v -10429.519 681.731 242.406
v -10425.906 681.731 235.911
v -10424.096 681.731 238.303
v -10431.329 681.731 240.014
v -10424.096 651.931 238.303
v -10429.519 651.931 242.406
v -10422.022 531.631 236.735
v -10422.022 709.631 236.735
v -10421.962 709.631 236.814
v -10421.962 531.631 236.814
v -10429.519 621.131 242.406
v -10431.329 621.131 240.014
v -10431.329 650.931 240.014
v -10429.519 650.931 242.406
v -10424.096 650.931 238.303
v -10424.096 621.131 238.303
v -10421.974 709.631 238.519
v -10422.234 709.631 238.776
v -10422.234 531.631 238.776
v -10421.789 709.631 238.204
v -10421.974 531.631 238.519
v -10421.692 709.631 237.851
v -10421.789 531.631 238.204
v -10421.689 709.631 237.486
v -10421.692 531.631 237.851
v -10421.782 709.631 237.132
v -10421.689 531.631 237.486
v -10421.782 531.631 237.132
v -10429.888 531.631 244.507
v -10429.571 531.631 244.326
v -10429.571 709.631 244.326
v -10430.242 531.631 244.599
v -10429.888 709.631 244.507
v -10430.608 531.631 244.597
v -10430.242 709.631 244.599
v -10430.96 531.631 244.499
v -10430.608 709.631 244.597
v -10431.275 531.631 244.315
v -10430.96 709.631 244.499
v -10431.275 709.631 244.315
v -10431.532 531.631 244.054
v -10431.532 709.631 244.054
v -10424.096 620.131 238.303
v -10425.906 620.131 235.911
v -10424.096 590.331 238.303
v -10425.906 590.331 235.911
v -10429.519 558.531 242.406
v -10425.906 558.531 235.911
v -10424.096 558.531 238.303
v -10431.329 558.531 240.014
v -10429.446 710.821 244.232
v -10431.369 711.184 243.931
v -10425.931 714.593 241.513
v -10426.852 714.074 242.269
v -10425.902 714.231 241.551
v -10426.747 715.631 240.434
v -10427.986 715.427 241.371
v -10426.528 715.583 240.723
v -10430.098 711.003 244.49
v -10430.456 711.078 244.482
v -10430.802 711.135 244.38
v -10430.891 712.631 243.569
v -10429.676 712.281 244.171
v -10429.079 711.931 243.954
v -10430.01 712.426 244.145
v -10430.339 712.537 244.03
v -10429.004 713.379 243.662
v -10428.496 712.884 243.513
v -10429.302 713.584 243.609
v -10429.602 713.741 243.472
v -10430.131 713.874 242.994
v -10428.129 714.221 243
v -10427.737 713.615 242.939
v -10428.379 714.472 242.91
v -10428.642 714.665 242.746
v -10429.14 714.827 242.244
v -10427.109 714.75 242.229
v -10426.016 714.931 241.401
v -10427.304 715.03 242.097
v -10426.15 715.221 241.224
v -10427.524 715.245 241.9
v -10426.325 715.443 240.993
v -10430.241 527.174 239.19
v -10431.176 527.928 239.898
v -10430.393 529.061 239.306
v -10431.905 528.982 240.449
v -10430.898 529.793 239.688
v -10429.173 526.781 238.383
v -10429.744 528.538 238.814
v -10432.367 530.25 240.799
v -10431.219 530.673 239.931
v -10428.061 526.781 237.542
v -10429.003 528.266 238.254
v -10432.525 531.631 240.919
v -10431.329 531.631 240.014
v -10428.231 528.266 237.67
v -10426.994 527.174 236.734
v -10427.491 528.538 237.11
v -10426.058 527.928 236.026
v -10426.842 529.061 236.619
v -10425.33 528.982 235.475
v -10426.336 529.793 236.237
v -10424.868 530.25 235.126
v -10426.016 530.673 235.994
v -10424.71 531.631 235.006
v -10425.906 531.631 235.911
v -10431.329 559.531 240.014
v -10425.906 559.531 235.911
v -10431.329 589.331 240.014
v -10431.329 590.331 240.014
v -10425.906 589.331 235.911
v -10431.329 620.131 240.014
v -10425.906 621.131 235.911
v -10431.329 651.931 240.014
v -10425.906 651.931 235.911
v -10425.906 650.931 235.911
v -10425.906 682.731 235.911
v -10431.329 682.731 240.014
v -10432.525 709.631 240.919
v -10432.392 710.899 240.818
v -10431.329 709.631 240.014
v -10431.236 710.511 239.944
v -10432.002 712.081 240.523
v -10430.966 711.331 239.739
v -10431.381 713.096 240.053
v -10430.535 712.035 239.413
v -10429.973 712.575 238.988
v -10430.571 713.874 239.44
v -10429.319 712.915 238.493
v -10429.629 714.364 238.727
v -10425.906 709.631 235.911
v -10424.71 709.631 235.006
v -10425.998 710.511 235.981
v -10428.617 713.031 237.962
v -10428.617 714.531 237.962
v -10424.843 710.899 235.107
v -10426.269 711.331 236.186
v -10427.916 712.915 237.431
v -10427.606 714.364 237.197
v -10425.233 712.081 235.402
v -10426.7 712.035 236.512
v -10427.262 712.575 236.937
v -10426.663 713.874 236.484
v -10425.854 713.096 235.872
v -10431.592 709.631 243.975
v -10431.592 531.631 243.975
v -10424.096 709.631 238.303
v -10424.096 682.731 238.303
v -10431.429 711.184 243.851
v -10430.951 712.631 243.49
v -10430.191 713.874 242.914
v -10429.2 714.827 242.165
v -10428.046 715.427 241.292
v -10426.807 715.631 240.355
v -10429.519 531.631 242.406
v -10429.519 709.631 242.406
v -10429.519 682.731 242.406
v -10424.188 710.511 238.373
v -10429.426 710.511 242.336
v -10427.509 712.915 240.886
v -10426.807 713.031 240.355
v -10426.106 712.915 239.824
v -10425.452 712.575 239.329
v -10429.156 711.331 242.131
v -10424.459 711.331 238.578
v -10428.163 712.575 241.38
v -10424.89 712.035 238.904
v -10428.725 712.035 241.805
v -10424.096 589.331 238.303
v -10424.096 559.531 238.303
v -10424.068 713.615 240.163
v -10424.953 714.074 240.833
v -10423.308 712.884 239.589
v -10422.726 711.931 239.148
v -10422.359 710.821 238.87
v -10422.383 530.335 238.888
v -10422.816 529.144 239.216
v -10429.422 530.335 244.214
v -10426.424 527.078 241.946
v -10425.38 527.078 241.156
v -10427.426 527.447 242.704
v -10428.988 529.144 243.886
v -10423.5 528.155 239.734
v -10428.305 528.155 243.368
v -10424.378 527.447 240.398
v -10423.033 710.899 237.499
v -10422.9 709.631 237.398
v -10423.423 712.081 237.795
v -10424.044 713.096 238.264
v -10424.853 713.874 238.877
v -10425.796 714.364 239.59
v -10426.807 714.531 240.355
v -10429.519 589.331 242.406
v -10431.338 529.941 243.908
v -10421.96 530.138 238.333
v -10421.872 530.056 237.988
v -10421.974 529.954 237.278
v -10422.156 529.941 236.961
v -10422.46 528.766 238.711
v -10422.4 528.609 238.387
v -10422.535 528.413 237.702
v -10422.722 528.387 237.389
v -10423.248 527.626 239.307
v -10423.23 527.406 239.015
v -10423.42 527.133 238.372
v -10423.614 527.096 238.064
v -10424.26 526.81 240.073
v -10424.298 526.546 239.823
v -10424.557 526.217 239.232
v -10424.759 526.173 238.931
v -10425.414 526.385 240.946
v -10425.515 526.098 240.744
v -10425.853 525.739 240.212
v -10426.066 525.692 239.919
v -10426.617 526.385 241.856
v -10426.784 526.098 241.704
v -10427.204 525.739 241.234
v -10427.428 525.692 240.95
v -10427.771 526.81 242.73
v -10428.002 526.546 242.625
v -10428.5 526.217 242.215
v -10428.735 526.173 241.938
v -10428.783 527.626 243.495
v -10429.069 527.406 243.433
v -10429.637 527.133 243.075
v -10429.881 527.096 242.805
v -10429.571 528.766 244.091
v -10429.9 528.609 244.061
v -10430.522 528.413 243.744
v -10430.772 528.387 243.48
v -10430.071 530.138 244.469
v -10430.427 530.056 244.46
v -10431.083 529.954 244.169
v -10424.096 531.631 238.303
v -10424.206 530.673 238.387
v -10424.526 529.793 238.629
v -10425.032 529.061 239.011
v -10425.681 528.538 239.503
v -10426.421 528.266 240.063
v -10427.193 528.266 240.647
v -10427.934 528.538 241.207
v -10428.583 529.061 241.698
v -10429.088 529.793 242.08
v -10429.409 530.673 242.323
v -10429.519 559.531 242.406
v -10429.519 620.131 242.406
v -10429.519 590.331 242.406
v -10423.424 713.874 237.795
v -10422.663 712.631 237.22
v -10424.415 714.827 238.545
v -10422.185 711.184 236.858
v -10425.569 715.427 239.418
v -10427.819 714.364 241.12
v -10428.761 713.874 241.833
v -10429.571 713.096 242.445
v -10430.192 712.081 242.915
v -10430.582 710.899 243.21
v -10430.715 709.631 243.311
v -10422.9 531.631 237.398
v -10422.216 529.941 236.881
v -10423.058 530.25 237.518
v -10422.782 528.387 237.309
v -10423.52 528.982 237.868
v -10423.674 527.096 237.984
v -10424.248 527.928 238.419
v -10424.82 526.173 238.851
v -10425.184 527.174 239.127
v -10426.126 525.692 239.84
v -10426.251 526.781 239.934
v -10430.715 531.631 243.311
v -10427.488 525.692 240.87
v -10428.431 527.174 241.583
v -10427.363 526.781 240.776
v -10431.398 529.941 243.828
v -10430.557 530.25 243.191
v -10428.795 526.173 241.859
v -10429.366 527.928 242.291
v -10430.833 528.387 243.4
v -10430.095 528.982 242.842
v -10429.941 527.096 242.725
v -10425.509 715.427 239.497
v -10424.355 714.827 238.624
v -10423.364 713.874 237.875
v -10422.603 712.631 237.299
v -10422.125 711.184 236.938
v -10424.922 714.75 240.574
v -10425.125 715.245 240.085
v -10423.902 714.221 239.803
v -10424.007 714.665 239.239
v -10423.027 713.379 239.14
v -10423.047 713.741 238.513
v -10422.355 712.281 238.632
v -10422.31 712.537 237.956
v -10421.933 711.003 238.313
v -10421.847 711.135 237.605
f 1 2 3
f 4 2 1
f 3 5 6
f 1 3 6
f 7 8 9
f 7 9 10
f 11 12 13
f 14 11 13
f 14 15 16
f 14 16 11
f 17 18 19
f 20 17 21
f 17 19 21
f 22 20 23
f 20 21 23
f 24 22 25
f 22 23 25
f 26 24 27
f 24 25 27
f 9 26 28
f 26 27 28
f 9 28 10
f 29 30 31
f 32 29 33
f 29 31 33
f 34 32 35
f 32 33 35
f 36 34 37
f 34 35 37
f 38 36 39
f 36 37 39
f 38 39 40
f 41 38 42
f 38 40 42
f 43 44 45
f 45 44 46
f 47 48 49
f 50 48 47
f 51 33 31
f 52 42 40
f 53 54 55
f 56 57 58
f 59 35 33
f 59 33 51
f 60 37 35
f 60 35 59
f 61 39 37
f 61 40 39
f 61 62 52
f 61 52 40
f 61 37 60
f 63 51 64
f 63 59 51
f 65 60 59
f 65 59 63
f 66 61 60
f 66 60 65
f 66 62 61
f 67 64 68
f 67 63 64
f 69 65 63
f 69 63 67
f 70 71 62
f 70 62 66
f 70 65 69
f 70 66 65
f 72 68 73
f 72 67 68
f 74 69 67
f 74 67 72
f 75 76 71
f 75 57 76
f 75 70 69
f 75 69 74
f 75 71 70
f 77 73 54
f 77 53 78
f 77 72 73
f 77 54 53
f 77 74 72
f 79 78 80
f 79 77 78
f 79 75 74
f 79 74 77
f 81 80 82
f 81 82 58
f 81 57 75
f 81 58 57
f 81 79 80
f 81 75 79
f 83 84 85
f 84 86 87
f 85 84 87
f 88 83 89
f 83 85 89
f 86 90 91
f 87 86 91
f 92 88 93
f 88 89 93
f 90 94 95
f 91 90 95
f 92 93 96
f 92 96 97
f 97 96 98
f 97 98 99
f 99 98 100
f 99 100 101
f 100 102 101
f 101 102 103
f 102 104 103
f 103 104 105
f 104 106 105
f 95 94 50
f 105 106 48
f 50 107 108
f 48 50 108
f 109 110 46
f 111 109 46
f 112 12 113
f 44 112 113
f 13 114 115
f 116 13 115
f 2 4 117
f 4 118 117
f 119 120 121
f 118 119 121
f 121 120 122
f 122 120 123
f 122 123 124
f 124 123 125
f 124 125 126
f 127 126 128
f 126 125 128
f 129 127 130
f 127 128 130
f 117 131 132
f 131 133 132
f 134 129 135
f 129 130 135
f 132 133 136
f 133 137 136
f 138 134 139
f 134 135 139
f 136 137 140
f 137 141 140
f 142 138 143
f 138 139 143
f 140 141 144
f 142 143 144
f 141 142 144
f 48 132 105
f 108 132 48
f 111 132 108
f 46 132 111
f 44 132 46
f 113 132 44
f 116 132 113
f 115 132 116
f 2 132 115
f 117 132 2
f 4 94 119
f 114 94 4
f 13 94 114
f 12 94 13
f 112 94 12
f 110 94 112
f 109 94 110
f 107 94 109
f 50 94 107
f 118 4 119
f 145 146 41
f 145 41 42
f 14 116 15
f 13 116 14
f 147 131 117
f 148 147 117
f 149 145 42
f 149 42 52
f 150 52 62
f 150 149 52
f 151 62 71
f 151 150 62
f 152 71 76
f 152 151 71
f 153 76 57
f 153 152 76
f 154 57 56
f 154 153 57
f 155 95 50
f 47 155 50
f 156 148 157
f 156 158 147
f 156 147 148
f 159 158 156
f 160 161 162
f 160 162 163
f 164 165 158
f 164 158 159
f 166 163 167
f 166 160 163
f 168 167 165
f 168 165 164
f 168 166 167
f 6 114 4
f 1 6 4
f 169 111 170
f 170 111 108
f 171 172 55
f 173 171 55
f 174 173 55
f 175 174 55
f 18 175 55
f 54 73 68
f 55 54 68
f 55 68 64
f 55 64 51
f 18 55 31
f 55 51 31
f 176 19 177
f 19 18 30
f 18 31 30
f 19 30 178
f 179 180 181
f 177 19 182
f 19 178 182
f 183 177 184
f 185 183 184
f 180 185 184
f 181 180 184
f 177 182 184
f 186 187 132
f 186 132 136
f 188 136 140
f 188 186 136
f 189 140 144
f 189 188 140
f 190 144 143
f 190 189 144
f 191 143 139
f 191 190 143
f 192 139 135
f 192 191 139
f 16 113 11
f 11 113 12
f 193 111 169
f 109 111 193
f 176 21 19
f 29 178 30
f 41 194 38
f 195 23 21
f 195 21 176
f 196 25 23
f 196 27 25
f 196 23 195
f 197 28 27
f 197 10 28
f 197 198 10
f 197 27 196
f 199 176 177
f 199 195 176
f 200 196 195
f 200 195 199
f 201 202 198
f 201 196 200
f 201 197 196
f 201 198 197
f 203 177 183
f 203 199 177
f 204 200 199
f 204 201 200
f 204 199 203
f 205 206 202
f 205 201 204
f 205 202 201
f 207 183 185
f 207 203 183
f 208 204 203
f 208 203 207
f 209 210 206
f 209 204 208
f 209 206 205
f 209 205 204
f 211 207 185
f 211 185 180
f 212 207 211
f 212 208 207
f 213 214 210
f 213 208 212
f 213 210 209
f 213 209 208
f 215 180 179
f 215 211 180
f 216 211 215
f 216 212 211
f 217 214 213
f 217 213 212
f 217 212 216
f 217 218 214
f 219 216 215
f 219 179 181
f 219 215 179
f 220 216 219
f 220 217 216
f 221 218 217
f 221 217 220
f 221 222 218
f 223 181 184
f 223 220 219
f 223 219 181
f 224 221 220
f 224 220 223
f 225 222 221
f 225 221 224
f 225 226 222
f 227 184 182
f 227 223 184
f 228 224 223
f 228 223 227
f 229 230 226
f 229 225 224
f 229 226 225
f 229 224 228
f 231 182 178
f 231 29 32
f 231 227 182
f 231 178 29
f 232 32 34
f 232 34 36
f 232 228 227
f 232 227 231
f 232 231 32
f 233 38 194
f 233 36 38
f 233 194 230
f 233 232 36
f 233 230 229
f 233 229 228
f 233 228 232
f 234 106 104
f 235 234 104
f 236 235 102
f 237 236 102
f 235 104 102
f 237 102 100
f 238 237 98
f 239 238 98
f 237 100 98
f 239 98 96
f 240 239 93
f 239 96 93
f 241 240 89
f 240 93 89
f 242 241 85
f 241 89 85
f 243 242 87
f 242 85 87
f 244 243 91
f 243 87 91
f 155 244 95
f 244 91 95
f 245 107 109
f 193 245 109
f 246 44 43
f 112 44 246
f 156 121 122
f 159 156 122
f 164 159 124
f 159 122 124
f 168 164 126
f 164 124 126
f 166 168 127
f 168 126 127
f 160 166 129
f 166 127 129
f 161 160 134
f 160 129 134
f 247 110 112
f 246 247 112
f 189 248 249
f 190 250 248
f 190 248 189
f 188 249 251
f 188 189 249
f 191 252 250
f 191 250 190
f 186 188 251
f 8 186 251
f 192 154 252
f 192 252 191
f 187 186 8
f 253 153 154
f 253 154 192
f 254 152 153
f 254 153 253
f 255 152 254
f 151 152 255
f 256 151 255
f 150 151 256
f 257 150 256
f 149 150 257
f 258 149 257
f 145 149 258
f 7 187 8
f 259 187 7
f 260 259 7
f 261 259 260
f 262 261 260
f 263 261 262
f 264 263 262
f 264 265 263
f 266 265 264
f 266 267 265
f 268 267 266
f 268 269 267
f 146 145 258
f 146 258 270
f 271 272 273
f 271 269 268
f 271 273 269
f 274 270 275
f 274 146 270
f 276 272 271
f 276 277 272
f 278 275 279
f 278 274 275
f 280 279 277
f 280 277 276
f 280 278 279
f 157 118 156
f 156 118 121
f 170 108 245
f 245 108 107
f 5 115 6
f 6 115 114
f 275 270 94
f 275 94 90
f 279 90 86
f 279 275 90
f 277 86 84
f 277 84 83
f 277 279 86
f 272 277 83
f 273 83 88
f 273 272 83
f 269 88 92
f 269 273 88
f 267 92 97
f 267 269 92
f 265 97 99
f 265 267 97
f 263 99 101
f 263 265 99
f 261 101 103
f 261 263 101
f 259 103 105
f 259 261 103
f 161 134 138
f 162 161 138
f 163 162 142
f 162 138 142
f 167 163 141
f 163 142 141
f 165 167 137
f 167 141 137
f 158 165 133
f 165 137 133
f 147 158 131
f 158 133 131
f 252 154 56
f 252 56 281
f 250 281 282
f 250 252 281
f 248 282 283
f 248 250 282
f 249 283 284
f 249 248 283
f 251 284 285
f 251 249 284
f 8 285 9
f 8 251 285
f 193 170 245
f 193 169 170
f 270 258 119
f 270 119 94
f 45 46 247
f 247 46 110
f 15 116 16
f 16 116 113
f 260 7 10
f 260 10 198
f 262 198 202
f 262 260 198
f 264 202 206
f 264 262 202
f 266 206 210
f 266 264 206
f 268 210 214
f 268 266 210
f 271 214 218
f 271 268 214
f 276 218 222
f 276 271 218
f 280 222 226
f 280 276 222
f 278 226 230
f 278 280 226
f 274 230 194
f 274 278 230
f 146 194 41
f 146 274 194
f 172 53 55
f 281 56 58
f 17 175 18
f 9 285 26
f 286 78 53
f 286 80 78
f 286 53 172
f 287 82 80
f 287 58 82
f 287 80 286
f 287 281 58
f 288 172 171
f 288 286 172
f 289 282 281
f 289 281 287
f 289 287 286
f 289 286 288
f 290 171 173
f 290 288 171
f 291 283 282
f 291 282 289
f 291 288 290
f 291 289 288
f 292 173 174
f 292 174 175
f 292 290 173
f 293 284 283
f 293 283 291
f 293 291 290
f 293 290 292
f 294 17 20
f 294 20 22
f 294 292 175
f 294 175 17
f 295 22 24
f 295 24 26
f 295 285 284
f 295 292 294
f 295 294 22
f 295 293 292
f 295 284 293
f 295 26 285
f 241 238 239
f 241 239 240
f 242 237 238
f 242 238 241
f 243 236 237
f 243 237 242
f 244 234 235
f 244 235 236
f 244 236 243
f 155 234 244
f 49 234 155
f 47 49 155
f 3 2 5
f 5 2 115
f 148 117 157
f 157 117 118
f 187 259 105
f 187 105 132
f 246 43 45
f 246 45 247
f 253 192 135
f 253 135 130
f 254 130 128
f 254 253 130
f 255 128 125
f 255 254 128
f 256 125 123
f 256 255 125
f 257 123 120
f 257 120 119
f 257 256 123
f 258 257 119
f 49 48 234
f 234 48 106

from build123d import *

# Parameters (mm, degrees)
BOSS_EXTRUDE1_DEPTH = 1.499997834
BOSS_EXTRUDE2_DEPTH = 2.999998821
CUT_EXTRUDE1_DEPTH  = 2.999999995
FILLET1_R           = 1.400201404
BOSS_EXTRUDE3_REACH = 8499.621
SKETCH4_W           = 6.8
SKETCH4_H           = 1


with BuildPart() as part:
    # Sketch1 → Boss-Extrude1 (new body)
    with BuildSketch(Plane(origin=(-3679.783466787, -3e-09, -4864.000529017), x_dir=(0, -1, 0), z_dir=(-0.6033298825291362, -4.862971078225009e-13, -0.7974917258801991))):
        with BuildLine():
            Line((-531.630972559, 8466.305810109), (-709.630972559, 8466.305810109))
            ThreePointArc((-709.630972559, 8466.305810109), (-713.873613004, 8464.548451039), (-715.630972559, 8460.305810795))
            ThreePointArc((-715.630972559, 8460.305810795), (-713.873613489, 8456.063169664), (-709.630972559, 8454.305810109))
            Line((-709.630972559, 8454.305810109), (-531.630972559, 8454.305810109))
            ThreePointArc((-531.630972559, 8454.305810109), (-525.630972559, 8460.305810109), (-531.630972559, 8466.305810109))
        make_face()
    extrude(amount=-BOSS_EXTRUDE1_DEPTH)

    # Sketch2 → Boss-Extrude2 (add)
    with BuildSketch(Plane(origin=(-3679.783466787, -3e-09, -4864.000529017), x_dir=(-0.7974917258801992, 3.679004651903849e-13, 0.6033298825291362), z_dir=(-0.6033298825291362, -4.862971078225007e-13, -0.7974917258801992))):
        with BuildLine():
            Line((8455.40581011, 531.630972551), (8455.40581011, 709.630972551))
            ThreePointArc((8455.40581011, 709.630972551), (8456.840986746, 713.095795642), (8460.305809725, 714.530972551))
            ThreePointArc((8460.305809725, 714.530972551), (8463.770633201, 713.095795914), (8465.20581011, 709.630972551))
            Line((8465.20581011, 709.630972551), (8465.20581011, 531.630972551))
            ThreePointArc((8465.20581011, 531.630972551), (8460.30581011, 526.730972551), (8455.40581011, 531.630972551))
        make_face()
    extrude(amount=BOSS_EXTRUDE2_DEPTH)

    # Sketch3 → Cut-Extrude1 (cut)
    with BuildSketch(Plane(origin=(-3681.593455723, -3e-09, -4866.393003255), x_dir=(-0.7974917258801991, 3.6790046519038474e-13, 0.6033298825291363), z_dir=(-0.6033298825291363, -4.862971078225009e-13, -0.7974917258801992))):
        with BuildLine():
            Line((8463.705809388, 531.630972551), (8463.705809388, 709.630972551))
            ThreePointArc((8463.705809388, 709.630972551), (8462.709972444, 712.035135607), (8460.305809388, 713.030972551))
            ThreePointArc((8460.305809388, 713.030972551), (8457.901646332, 712.035135607), (8456.905809388, 709.630972551))
            Line((8456.905809388, 709.630972551), (8456.905809388, 531.630972551))
            ThreePointArc((8456.905809388, 531.630972551), (8460.305809388, 528.230972551), (8463.705809388, 531.630972551))
        make_face()
    extrude(amount=-CUT_EXTRUDE1_DEPTH, mode=Mode.SUBTRACT)

    # Fillet1
    fillet1_edges = [part.edges().sort_by_distance(p)[0] for p in [
        (-10422.518884598, 713.87361348, 238.991305657),
        (-10421.117404893, 620.630972551, 237.931038123),
        (-10425.902355248, 525.630972551, 241.551017418),
        (-10430.687305604, 620.630972551, 245.170996713),
    ]]
    fillet(fillet1_edges, radius=FILLET1_R)

    # Sketch4 → Boss-Extrude3 (add, up to next)
    with BuildSketch(Plane(origin=(-3681.593455723, -3e-09, -4866.393003255), x_dir=(-0.7974917258801991, 3.679004651903847e-13, 0.6033298825291363), z_dir=(-0.6033298825291363, -4.862971078225008e-13, -0.7974917258801992)), mode=Mode.PRIVATE) as boss_extrude3_sk1:
        with Locations((8460.305809388, 682.230972551)):
            Rectangle(SKETCH4_W, SKETCH4_H)
    boss_extrude3_tool1 = extrude(boss_extrude3_sk1.sketch, amount=-BOSS_EXTRUDE3_REACH, mode=Mode.PRIVATE) - part.part
    # Sketch4 → Boss-Extrude3 (add, up to next)
    with BuildSketch(Plane(origin=(-3681.593455723, -3e-09, -4866.393003255), x_dir=(-0.7974917258801991, 3.679004651903847e-13, 0.6033298825291363), z_dir=(-0.6033298825291363, -4.862971078225008e-13, -0.7974917258801992)), mode=Mode.PRIVATE) as boss_extrude3_sk2:
        with Locations((8460.305809388, 651.430972551)):
            Rectangle(SKETCH4_W, SKETCH4_H)
    boss_extrude3_tool2 = extrude(boss_extrude3_sk2.sketch, amount=-BOSS_EXTRUDE3_REACH, mode=Mode.PRIVATE) - part.part
    # Sketch4 → Boss-Extrude3 (add, up to next)
    with BuildSketch(Plane(origin=(-3681.593455723, -3e-09, -4866.393003255), x_dir=(-0.7974917258801991, 3.679004651903847e-13, 0.6033298825291363), z_dir=(-0.6033298825291363, -4.862971078225008e-13, -0.7974917258801992)), mode=Mode.PRIVATE) as boss_extrude3_sk3:
        with Locations((8460.305809388, 620.630972551)):
            Rectangle(SKETCH4_W, SKETCH4_H)
    boss_extrude3_tool3 = extrude(boss_extrude3_sk3.sketch, amount=-BOSS_EXTRUDE3_REACH, mode=Mode.PRIVATE) - part.part
    # Sketch4 → Boss-Extrude3 (add, up to next)
    with BuildSketch(Plane(origin=(-3681.593455723, -3e-09, -4866.393003255), x_dir=(-0.7974917258801991, 3.679004651903847e-13, 0.6033298825291363), z_dir=(-0.6033298825291363, -4.862971078225008e-13, -0.7974917258801992)), mode=Mode.PRIVATE) as boss_extrude3_sk4:
        with Locations((8460.305809388, 589.830972551)):
            Rectangle(SKETCH4_W, SKETCH4_H)
    boss_extrude3_tool4 = extrude(boss_extrude3_sk4.sketch, amount=-BOSS_EXTRUDE3_REACH, mode=Mode.PRIVATE) - part.part
    # Sketch4 → Boss-Extrude3 (add, up to next)
    with BuildSketch(Plane(origin=(-3681.593455723, -3e-09, -4866.393003255), x_dir=(-0.7974917258801991, 3.679004651903847e-13, 0.6033298825291363), z_dir=(-0.6033298825291363, -4.862971078225008e-13, -0.7974917258801992)), mode=Mode.PRIVATE) as boss_extrude3_sk5:
        with Locations((8460.305809388, 559.030972551)):
            Rectangle(SKETCH4_W, SKETCH4_H)
    boss_extrude3_tool5 = extrude(boss_extrude3_sk5.sketch, amount=-BOSS_EXTRUDE3_REACH, mode=Mode.PRIVATE) - part.part
    add(boss_extrude3_tool1.solids().sort_by_distance((-10428.617337, 682.230973, 237.962307))[0])
    add(boss_extrude3_tool2.solids().sort_by_distance((-10428.617337, 651.430973, 237.962307))[0])
    add(boss_extrude3_tool3.solids().sort_by_distance((-10428.617337, 620.630973, 237.962307))[0])
    add(boss_extrude3_tool4.solids().sort_by_distance((-10428.617337, 589.830973, 237.962307))[0])
    add(boss_extrude3_tool5.solids().sort_by_distance((-10428.617337, 559.030973, 237.962307))[0])


solid = part.part
